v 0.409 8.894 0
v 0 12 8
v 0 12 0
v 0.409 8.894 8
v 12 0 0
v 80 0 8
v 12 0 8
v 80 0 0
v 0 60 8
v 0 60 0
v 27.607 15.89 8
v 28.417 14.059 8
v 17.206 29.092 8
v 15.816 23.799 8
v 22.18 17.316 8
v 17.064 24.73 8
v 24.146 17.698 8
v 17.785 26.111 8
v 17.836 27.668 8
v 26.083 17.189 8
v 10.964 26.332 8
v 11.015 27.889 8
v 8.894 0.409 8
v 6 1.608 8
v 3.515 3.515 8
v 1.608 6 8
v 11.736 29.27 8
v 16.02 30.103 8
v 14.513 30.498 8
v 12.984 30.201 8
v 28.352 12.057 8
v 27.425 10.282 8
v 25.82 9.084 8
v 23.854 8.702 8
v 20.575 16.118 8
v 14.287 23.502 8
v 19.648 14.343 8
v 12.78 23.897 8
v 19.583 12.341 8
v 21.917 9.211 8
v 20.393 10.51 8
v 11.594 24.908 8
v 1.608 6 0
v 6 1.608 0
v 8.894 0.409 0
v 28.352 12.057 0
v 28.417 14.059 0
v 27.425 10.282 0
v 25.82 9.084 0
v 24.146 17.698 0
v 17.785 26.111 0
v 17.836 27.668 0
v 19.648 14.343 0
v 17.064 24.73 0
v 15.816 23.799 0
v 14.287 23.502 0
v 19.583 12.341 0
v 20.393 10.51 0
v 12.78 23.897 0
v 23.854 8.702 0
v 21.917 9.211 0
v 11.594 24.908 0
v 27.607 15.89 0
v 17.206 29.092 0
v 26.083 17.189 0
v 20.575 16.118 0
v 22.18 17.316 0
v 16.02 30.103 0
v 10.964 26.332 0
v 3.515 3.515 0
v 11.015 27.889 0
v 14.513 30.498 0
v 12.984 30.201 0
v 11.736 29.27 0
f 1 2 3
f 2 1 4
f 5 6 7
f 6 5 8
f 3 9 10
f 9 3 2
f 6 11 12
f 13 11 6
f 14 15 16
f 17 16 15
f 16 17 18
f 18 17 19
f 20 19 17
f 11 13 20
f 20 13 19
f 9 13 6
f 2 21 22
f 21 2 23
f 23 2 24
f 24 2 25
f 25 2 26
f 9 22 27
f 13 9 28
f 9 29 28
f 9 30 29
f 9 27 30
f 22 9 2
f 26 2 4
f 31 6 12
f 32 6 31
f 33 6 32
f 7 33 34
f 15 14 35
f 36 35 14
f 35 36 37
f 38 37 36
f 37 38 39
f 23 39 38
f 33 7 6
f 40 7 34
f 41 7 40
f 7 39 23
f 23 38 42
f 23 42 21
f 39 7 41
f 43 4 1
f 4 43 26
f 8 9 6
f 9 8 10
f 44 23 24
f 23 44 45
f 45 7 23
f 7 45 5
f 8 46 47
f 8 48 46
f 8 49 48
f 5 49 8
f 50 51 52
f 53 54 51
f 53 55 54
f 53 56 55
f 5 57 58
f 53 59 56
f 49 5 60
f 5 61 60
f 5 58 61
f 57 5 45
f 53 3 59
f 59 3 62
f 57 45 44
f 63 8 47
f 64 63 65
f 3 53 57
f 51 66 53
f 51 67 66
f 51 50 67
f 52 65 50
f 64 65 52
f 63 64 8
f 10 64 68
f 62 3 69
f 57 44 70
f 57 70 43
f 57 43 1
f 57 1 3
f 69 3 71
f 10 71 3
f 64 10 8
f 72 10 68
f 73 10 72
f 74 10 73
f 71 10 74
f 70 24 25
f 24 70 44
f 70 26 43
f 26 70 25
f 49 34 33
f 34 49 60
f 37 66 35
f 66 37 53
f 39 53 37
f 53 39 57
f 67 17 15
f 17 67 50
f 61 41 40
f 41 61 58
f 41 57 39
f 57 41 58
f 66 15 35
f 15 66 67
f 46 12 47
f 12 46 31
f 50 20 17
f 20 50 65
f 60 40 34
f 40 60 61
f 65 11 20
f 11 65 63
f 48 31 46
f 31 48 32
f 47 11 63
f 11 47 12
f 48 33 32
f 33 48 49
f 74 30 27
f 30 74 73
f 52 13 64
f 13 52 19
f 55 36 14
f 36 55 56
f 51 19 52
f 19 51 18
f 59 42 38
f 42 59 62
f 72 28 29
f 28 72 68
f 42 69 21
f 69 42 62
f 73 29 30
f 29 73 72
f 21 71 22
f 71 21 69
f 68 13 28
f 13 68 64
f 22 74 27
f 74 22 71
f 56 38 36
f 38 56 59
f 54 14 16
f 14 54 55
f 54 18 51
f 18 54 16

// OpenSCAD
$fn = 32;

// ----------------------------------------------------------------------
// Bracket plate: corner pad 80 x 60, fillet R12
// ----------------------------------------------------------------------

// --- parameters (mm) ---
hole_r = 3.5;             // bolt hole radius
plate_t = 8;              // plate thickness, Z (extrusion height)
leg_a = 80;               // base leg
leg_b = 60;               // height leg
fillet_r = 12;            // right-angle fillet radius

hole_d1 = 2 * hole_r + 2;
hole_d2 = 2 * hole_r;

profile = [[12, 0], [80, 0], [0, 60], [0, 12], [0.409, 8.894], [1.608, 6], [3.515, 3.515], [6, 1.608], [8.894, 0.409]];  // primary outline, 9 points, counter clockwise
void_1 = [[28.417, 14.059], [27.607, 15.89], [26.083, 17.189], [24.146, 17.698], [22.18, 17.316], [20.575, 16.118], [19.648, 14.343], [19.583, 12.341], [20.393, 10.51], [21.917, 9.211], [23.854, 8.702], [25.82, 9.084], [27.425, 10.282], [28.352, 12.057]];  // mount hole 1, 14 points
void_2 = [[17.836, 27.668], [17.206, 29.092], [16.02, 30.103], [14.513, 30.498], [12.984, 30.201], [11.736, 29.27], [11.015, 27.889], [10.964, 26.332], [11.594, 24.908], [12.78, 23.897], [14.287, 23.502], [15.816, 23.799], [17.064, 24.73], [17.785, 26.111]];  // mount hole 2, 14 points

// --- the one profile operation ---
difference() {
  linear_extrude(height = plate_t) polygon(points = profile);
  translate([0, 0, -1])
    linear_extrude(height = plate_t + 2) polygon(points = void_1);
  translate([0, 0, -1])
    linear_extrude(height = plate_t + 2) polygon(points = void_2);
}
